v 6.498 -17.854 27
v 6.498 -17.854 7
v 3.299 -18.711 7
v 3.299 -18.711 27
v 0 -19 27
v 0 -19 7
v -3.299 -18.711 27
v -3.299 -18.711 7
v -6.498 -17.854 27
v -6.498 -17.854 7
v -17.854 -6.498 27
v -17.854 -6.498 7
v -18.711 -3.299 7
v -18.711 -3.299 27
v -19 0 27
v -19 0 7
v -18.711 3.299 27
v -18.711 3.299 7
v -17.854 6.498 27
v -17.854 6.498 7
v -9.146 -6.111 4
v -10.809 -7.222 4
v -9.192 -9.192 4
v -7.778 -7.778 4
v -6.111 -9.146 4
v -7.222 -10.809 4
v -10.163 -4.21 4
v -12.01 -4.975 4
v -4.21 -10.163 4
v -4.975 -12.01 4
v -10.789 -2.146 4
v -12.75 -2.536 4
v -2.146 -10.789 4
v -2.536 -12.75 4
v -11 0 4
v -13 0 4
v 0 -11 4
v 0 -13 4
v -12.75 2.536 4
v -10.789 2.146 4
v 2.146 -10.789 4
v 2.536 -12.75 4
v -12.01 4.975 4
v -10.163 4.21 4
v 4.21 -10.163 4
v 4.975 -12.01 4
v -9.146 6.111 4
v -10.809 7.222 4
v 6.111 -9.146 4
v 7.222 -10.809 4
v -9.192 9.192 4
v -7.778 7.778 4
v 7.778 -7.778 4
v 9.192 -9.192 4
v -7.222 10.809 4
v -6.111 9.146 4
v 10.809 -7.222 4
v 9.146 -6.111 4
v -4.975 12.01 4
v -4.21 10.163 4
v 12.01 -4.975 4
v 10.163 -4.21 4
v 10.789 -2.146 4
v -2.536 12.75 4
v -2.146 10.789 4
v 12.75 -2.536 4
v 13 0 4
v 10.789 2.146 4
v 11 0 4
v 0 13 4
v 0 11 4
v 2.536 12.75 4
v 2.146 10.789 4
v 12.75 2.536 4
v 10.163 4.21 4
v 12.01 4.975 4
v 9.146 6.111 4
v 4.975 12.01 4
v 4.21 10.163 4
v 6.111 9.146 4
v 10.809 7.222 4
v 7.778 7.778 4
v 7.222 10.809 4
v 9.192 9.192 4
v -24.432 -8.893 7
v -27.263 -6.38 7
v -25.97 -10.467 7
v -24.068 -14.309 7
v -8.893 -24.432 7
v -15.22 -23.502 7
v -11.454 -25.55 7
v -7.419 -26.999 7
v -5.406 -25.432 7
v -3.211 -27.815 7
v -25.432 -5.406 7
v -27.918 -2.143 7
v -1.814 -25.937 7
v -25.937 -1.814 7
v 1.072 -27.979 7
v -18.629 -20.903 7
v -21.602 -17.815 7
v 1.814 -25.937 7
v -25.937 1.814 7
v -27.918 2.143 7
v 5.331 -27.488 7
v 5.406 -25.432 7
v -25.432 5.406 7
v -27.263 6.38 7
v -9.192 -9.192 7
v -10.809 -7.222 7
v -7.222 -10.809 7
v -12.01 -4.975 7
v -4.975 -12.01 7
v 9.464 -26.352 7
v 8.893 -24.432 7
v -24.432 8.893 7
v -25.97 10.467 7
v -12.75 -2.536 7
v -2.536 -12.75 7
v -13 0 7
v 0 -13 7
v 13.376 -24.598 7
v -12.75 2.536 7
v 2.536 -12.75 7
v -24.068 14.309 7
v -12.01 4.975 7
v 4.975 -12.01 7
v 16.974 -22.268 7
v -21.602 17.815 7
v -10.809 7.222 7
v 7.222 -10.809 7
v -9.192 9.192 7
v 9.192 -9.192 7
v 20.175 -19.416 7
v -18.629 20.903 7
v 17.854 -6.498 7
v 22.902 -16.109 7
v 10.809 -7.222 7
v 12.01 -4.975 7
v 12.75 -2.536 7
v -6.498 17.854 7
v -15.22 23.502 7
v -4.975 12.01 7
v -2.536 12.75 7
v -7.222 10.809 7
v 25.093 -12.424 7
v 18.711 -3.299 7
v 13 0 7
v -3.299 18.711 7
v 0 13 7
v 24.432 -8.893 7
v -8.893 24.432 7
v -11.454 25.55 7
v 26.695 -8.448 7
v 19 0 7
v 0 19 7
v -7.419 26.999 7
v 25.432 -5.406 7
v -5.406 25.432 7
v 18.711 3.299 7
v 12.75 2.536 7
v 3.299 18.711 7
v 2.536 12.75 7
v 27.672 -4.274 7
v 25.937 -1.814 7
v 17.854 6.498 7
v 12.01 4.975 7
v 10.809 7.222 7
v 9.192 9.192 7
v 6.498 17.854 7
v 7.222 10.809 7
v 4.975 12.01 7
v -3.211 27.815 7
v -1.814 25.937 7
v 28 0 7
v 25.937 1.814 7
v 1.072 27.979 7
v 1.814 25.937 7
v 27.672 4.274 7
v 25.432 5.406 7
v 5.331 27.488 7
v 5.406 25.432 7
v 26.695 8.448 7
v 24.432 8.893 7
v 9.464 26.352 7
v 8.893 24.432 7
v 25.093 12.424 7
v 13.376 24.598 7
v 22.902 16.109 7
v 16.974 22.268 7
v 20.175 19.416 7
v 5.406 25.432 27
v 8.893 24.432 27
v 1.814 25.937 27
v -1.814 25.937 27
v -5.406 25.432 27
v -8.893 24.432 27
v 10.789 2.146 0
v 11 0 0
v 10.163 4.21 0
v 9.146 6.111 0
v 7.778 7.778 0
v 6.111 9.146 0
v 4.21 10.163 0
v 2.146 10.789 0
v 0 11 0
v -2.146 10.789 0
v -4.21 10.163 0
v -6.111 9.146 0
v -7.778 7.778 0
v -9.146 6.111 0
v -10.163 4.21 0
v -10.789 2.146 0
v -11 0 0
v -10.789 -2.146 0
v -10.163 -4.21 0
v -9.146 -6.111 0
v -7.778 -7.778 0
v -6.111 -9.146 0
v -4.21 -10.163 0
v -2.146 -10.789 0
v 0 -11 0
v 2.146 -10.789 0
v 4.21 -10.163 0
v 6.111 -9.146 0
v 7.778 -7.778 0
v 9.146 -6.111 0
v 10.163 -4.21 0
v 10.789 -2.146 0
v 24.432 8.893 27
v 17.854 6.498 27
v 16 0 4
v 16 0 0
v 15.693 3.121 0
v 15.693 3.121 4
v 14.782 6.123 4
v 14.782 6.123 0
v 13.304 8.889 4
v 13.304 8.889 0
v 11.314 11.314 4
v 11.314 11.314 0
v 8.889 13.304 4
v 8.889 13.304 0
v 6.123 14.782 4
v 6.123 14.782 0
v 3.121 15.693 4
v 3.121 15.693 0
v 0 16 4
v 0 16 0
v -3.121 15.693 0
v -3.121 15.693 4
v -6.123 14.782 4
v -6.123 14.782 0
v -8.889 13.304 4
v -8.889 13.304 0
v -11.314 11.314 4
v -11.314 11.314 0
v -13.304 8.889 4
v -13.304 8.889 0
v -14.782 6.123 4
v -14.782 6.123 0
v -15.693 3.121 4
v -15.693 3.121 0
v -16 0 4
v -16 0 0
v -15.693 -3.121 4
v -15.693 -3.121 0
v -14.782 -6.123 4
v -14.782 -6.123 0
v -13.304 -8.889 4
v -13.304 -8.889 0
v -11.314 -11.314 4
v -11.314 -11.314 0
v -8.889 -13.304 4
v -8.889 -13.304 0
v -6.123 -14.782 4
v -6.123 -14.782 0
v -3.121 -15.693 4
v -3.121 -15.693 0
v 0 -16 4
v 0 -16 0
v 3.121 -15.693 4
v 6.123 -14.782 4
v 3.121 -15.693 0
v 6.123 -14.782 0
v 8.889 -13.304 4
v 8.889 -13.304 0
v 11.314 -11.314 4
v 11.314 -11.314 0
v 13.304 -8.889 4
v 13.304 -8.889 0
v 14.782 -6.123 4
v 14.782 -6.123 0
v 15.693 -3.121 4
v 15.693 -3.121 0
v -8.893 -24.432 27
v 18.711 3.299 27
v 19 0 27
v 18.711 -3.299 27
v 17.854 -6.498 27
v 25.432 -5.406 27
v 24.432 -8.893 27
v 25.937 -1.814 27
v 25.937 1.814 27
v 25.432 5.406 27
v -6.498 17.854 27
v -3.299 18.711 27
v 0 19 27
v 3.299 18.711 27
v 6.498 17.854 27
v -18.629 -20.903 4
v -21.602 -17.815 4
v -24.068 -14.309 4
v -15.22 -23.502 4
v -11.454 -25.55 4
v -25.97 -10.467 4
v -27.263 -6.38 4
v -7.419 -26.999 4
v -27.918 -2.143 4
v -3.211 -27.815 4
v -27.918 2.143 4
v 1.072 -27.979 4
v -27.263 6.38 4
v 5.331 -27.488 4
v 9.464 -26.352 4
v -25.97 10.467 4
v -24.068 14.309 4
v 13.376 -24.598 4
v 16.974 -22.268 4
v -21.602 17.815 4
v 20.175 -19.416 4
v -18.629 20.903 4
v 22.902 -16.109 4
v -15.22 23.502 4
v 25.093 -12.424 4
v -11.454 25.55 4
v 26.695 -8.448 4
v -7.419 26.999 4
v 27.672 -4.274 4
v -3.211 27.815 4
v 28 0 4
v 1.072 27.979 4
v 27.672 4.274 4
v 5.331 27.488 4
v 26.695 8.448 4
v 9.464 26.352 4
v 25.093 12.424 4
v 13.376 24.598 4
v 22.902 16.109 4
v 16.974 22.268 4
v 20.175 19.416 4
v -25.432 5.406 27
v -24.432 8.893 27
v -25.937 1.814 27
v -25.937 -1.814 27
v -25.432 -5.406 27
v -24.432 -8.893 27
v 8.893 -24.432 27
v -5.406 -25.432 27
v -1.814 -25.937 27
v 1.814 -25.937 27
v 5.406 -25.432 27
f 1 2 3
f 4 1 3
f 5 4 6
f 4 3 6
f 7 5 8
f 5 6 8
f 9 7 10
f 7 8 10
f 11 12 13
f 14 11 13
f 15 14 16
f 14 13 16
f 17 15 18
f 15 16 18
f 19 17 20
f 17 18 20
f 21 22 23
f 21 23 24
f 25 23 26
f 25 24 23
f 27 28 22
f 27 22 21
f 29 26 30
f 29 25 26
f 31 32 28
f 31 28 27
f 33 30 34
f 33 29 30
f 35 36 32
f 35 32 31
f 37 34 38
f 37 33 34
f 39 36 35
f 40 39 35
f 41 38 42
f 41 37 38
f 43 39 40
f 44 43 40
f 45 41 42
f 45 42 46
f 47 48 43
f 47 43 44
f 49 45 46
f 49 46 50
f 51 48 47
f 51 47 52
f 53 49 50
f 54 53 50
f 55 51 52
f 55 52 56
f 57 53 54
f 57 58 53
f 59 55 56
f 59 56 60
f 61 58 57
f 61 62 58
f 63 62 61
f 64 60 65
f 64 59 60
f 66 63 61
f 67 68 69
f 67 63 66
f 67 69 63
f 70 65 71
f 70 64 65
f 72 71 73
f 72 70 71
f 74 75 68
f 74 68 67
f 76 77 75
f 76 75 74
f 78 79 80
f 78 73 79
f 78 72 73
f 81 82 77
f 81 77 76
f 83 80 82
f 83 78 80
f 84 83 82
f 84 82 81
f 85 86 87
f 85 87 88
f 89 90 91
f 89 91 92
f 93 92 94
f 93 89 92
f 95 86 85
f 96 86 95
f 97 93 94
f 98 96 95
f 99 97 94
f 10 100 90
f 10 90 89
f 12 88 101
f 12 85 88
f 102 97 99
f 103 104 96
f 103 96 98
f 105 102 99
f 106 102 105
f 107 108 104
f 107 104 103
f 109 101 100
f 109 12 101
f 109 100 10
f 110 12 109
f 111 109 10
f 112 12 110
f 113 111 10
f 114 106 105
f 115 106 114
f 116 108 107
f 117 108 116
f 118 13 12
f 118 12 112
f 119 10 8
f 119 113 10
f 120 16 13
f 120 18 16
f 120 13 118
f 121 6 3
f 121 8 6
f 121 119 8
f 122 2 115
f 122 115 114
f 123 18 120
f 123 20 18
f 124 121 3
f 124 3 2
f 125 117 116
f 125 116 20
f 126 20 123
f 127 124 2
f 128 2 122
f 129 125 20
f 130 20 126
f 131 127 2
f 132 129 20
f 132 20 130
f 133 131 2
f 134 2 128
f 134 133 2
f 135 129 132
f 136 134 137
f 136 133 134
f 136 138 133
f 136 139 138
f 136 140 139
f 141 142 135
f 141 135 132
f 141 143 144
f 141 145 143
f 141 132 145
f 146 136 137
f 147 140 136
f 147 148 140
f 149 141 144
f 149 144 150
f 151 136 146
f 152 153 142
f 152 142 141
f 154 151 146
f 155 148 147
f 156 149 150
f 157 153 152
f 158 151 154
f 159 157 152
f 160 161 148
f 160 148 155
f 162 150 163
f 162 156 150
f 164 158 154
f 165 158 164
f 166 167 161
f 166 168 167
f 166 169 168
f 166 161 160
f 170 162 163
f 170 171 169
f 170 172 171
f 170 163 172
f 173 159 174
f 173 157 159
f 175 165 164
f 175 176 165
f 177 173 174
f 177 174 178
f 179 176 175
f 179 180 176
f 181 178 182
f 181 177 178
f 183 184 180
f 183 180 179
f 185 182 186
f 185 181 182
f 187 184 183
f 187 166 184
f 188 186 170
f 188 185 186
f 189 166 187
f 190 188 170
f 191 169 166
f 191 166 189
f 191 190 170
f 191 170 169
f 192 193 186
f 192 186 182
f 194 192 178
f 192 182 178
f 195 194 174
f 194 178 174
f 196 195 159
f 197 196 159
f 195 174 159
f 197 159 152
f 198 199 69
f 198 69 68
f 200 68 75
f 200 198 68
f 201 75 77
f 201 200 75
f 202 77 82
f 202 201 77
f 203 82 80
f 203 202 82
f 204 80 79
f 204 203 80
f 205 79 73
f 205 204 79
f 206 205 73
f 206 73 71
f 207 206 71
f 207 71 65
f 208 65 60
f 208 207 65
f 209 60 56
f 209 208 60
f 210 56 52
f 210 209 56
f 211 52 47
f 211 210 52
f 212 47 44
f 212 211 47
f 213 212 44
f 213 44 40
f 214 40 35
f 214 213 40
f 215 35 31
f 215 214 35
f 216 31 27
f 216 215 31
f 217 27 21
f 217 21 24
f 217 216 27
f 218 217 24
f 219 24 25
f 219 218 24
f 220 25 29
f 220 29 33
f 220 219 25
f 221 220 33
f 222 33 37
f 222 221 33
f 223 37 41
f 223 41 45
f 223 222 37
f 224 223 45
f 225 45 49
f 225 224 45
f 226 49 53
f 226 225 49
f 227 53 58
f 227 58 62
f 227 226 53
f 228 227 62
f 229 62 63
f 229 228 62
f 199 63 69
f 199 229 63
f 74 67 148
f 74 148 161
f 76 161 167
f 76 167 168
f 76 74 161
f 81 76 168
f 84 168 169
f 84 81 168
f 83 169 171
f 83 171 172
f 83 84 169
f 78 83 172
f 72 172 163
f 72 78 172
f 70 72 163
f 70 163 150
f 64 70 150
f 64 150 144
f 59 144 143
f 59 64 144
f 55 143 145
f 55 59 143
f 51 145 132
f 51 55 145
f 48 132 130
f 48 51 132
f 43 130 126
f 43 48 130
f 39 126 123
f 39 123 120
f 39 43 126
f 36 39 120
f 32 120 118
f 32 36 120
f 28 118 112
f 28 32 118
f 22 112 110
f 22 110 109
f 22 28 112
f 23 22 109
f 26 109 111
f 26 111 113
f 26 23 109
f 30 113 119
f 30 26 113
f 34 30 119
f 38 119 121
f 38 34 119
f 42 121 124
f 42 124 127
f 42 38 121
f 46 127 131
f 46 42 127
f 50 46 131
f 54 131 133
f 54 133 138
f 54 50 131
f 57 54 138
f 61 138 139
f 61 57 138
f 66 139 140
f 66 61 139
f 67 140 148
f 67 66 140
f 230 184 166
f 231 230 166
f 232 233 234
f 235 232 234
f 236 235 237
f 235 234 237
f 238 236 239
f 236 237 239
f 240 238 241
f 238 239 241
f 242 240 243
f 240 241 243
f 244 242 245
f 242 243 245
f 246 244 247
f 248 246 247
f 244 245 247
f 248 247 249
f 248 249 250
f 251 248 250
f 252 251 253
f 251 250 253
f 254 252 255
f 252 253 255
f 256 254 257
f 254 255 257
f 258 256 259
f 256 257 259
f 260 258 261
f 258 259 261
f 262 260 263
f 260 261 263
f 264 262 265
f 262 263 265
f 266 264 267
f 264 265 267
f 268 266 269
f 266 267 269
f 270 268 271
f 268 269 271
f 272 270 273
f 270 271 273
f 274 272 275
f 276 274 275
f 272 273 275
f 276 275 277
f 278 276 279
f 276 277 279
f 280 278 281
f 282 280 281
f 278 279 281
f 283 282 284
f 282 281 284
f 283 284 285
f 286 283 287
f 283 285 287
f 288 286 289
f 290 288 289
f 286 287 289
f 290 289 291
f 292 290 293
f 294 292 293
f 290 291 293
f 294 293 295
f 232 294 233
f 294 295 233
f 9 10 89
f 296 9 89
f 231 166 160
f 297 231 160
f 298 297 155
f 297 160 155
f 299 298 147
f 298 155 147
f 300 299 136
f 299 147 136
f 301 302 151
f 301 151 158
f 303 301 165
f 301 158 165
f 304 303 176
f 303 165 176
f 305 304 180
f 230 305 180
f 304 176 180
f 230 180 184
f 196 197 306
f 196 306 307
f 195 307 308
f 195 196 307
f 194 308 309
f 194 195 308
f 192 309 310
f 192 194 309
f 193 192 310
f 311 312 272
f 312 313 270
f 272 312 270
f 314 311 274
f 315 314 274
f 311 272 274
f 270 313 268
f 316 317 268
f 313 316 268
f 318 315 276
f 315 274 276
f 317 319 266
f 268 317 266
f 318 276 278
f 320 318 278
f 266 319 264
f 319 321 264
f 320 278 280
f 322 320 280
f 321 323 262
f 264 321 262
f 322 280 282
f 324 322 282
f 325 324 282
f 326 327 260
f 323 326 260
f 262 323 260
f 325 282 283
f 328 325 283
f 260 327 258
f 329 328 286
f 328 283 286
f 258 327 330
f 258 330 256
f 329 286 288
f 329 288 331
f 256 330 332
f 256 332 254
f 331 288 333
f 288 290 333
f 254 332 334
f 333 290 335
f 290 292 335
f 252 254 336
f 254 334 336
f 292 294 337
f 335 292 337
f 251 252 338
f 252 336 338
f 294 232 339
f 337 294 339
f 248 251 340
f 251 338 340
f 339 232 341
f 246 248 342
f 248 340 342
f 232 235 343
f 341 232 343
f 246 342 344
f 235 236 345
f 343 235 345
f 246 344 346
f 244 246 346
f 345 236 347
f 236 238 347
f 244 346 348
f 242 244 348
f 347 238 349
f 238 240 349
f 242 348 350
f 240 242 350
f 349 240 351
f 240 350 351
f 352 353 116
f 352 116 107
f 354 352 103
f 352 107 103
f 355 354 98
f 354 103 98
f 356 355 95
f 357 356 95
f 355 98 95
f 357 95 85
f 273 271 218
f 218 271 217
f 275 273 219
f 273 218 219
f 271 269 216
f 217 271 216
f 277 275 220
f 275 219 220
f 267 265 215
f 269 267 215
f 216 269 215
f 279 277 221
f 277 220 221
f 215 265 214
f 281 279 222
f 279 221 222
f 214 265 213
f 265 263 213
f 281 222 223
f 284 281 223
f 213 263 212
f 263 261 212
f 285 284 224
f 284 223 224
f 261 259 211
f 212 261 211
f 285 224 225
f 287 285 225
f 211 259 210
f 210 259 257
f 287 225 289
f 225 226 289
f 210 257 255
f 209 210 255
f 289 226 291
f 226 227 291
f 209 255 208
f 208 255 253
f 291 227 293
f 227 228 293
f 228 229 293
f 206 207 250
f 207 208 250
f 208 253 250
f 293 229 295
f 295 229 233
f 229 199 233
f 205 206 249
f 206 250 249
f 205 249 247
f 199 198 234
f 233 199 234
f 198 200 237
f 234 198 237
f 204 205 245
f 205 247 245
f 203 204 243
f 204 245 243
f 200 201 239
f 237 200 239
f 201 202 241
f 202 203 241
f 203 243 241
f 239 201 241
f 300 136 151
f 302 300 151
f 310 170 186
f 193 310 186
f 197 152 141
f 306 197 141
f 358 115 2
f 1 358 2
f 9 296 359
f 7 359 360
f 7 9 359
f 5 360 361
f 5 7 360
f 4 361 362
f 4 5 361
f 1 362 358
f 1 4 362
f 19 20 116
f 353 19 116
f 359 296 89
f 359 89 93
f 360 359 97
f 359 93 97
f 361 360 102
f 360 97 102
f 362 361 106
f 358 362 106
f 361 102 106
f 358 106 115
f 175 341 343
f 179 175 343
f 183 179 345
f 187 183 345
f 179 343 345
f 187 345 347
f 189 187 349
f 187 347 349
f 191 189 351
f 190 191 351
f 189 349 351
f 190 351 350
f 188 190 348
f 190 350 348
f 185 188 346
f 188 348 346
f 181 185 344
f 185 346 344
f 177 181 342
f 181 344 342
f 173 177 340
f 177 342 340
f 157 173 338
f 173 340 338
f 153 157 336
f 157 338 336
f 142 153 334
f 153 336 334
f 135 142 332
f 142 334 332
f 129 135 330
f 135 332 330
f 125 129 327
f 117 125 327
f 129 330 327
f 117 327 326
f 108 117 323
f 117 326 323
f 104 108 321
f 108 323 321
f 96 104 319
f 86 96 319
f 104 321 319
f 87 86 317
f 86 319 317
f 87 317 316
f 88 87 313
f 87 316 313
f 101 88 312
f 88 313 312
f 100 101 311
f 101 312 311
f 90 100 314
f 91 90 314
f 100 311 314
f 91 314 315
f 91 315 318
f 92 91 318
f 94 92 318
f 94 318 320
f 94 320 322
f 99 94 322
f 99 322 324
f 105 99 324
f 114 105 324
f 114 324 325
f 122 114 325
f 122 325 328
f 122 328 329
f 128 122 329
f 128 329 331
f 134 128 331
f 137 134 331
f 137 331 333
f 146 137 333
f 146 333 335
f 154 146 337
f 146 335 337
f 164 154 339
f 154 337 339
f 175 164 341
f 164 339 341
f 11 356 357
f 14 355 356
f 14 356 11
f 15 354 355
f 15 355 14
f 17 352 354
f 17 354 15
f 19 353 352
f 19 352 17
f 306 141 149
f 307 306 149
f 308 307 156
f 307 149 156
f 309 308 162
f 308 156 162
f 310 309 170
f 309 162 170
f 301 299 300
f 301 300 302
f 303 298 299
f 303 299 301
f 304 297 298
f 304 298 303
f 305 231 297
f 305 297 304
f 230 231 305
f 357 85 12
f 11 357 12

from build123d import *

# Parameters (mm, degrees)
SKETCH_1_R      = 16
SKETCH_1_R_2    = 11
EXTRUDE_1_DEPTH = 4
SKETCH_2_R      = 28
SKETCH_2_R_2    = 13
EXTRUDE_2_DEPTH = 3
EXTRUDE_3_DEPTH = 20


with BuildPart() as part:
    # 草图1 → 凸台-拉伸1 (new body)
    with BuildSketch(Plane.XY):
        Circle(SKETCH_1_R)
        Circle(SKETCH_1_R_2, mode=Mode.SUBTRACT)
    extrude(amount=EXTRUDE_1_DEPTH)

    # 草图2 → 凸台-拉伸2 (add)
    with BuildSketch(Plane.XY.offset(4)):
        Circle(SKETCH_2_R)
        Circle(SKETCH_2_R_2, mode=Mode.SUBTRACT)
    extrude(amount=EXTRUDE_2_DEPTH)

    # 草图3 → 凸台-拉伸3 (add)
    with BuildSketch(Plane.XY.offset(7)):
        with BuildLine():
            Line((-8.892523726, 24.43200814), (-6.498382723, 17.854159795))
            ThreePointArc((-6.498382723, 17.854159795), (0, 19), (6.498382723, 17.854159795))
            Line((6.498382723, 17.854159795), (8.892523726, 24.43200814))
            ThreePointArc((8.892523726, 24.43200814), (0, 26), (-8.892523726, 24.43200814))
        make_face()
        with BuildLine():
            Line((24.43200814, 8.892523726), (17.854159795, 6.498382723))
            ThreePointArc((17.854159795, 6.498382723), (19, 0), (17.854159795, -6.498382723))
            Line((17.854159795, -6.498382723), (24.43200814, -8.892523726))
            ThreePointArc((24.43200814, -8.892523726), (26, 0), (24.43200814, 8.892523726))
        make_face()
        with BuildLine():
            Line((8.892523726, -24.43200814), (6.498382723, -17.854159795))
            ThreePointArc((6.498382723, -17.854159795), (0, -19), (-6.498382723, -17.854159795))
            Line((-6.498382723, -17.854159795), (-8.892523726, -24.43200814))
            ThreePointArc((-8.892523726, -24.43200814), (0, -26), (8.892523726, -24.43200814))
        make_face()
        with BuildLine():
            Line((-24.43200814, -8.892523726), (-17.854159795, -6.498382723))
            ThreePointArc((-17.854159795, -6.498382723), (-19, 0), (-17.854159795, 6.498382723))
            Line((-17.854159795, 6.498382723), (-24.43200814, 8.892523726))
            ThreePointArc((-24.43200814, 8.892523726), (-26, 0), (-24.43200814, -8.892523726))
        make_face()
    extrude(amount=EXTRUDE_3_DEPTH)


solid = part.part
